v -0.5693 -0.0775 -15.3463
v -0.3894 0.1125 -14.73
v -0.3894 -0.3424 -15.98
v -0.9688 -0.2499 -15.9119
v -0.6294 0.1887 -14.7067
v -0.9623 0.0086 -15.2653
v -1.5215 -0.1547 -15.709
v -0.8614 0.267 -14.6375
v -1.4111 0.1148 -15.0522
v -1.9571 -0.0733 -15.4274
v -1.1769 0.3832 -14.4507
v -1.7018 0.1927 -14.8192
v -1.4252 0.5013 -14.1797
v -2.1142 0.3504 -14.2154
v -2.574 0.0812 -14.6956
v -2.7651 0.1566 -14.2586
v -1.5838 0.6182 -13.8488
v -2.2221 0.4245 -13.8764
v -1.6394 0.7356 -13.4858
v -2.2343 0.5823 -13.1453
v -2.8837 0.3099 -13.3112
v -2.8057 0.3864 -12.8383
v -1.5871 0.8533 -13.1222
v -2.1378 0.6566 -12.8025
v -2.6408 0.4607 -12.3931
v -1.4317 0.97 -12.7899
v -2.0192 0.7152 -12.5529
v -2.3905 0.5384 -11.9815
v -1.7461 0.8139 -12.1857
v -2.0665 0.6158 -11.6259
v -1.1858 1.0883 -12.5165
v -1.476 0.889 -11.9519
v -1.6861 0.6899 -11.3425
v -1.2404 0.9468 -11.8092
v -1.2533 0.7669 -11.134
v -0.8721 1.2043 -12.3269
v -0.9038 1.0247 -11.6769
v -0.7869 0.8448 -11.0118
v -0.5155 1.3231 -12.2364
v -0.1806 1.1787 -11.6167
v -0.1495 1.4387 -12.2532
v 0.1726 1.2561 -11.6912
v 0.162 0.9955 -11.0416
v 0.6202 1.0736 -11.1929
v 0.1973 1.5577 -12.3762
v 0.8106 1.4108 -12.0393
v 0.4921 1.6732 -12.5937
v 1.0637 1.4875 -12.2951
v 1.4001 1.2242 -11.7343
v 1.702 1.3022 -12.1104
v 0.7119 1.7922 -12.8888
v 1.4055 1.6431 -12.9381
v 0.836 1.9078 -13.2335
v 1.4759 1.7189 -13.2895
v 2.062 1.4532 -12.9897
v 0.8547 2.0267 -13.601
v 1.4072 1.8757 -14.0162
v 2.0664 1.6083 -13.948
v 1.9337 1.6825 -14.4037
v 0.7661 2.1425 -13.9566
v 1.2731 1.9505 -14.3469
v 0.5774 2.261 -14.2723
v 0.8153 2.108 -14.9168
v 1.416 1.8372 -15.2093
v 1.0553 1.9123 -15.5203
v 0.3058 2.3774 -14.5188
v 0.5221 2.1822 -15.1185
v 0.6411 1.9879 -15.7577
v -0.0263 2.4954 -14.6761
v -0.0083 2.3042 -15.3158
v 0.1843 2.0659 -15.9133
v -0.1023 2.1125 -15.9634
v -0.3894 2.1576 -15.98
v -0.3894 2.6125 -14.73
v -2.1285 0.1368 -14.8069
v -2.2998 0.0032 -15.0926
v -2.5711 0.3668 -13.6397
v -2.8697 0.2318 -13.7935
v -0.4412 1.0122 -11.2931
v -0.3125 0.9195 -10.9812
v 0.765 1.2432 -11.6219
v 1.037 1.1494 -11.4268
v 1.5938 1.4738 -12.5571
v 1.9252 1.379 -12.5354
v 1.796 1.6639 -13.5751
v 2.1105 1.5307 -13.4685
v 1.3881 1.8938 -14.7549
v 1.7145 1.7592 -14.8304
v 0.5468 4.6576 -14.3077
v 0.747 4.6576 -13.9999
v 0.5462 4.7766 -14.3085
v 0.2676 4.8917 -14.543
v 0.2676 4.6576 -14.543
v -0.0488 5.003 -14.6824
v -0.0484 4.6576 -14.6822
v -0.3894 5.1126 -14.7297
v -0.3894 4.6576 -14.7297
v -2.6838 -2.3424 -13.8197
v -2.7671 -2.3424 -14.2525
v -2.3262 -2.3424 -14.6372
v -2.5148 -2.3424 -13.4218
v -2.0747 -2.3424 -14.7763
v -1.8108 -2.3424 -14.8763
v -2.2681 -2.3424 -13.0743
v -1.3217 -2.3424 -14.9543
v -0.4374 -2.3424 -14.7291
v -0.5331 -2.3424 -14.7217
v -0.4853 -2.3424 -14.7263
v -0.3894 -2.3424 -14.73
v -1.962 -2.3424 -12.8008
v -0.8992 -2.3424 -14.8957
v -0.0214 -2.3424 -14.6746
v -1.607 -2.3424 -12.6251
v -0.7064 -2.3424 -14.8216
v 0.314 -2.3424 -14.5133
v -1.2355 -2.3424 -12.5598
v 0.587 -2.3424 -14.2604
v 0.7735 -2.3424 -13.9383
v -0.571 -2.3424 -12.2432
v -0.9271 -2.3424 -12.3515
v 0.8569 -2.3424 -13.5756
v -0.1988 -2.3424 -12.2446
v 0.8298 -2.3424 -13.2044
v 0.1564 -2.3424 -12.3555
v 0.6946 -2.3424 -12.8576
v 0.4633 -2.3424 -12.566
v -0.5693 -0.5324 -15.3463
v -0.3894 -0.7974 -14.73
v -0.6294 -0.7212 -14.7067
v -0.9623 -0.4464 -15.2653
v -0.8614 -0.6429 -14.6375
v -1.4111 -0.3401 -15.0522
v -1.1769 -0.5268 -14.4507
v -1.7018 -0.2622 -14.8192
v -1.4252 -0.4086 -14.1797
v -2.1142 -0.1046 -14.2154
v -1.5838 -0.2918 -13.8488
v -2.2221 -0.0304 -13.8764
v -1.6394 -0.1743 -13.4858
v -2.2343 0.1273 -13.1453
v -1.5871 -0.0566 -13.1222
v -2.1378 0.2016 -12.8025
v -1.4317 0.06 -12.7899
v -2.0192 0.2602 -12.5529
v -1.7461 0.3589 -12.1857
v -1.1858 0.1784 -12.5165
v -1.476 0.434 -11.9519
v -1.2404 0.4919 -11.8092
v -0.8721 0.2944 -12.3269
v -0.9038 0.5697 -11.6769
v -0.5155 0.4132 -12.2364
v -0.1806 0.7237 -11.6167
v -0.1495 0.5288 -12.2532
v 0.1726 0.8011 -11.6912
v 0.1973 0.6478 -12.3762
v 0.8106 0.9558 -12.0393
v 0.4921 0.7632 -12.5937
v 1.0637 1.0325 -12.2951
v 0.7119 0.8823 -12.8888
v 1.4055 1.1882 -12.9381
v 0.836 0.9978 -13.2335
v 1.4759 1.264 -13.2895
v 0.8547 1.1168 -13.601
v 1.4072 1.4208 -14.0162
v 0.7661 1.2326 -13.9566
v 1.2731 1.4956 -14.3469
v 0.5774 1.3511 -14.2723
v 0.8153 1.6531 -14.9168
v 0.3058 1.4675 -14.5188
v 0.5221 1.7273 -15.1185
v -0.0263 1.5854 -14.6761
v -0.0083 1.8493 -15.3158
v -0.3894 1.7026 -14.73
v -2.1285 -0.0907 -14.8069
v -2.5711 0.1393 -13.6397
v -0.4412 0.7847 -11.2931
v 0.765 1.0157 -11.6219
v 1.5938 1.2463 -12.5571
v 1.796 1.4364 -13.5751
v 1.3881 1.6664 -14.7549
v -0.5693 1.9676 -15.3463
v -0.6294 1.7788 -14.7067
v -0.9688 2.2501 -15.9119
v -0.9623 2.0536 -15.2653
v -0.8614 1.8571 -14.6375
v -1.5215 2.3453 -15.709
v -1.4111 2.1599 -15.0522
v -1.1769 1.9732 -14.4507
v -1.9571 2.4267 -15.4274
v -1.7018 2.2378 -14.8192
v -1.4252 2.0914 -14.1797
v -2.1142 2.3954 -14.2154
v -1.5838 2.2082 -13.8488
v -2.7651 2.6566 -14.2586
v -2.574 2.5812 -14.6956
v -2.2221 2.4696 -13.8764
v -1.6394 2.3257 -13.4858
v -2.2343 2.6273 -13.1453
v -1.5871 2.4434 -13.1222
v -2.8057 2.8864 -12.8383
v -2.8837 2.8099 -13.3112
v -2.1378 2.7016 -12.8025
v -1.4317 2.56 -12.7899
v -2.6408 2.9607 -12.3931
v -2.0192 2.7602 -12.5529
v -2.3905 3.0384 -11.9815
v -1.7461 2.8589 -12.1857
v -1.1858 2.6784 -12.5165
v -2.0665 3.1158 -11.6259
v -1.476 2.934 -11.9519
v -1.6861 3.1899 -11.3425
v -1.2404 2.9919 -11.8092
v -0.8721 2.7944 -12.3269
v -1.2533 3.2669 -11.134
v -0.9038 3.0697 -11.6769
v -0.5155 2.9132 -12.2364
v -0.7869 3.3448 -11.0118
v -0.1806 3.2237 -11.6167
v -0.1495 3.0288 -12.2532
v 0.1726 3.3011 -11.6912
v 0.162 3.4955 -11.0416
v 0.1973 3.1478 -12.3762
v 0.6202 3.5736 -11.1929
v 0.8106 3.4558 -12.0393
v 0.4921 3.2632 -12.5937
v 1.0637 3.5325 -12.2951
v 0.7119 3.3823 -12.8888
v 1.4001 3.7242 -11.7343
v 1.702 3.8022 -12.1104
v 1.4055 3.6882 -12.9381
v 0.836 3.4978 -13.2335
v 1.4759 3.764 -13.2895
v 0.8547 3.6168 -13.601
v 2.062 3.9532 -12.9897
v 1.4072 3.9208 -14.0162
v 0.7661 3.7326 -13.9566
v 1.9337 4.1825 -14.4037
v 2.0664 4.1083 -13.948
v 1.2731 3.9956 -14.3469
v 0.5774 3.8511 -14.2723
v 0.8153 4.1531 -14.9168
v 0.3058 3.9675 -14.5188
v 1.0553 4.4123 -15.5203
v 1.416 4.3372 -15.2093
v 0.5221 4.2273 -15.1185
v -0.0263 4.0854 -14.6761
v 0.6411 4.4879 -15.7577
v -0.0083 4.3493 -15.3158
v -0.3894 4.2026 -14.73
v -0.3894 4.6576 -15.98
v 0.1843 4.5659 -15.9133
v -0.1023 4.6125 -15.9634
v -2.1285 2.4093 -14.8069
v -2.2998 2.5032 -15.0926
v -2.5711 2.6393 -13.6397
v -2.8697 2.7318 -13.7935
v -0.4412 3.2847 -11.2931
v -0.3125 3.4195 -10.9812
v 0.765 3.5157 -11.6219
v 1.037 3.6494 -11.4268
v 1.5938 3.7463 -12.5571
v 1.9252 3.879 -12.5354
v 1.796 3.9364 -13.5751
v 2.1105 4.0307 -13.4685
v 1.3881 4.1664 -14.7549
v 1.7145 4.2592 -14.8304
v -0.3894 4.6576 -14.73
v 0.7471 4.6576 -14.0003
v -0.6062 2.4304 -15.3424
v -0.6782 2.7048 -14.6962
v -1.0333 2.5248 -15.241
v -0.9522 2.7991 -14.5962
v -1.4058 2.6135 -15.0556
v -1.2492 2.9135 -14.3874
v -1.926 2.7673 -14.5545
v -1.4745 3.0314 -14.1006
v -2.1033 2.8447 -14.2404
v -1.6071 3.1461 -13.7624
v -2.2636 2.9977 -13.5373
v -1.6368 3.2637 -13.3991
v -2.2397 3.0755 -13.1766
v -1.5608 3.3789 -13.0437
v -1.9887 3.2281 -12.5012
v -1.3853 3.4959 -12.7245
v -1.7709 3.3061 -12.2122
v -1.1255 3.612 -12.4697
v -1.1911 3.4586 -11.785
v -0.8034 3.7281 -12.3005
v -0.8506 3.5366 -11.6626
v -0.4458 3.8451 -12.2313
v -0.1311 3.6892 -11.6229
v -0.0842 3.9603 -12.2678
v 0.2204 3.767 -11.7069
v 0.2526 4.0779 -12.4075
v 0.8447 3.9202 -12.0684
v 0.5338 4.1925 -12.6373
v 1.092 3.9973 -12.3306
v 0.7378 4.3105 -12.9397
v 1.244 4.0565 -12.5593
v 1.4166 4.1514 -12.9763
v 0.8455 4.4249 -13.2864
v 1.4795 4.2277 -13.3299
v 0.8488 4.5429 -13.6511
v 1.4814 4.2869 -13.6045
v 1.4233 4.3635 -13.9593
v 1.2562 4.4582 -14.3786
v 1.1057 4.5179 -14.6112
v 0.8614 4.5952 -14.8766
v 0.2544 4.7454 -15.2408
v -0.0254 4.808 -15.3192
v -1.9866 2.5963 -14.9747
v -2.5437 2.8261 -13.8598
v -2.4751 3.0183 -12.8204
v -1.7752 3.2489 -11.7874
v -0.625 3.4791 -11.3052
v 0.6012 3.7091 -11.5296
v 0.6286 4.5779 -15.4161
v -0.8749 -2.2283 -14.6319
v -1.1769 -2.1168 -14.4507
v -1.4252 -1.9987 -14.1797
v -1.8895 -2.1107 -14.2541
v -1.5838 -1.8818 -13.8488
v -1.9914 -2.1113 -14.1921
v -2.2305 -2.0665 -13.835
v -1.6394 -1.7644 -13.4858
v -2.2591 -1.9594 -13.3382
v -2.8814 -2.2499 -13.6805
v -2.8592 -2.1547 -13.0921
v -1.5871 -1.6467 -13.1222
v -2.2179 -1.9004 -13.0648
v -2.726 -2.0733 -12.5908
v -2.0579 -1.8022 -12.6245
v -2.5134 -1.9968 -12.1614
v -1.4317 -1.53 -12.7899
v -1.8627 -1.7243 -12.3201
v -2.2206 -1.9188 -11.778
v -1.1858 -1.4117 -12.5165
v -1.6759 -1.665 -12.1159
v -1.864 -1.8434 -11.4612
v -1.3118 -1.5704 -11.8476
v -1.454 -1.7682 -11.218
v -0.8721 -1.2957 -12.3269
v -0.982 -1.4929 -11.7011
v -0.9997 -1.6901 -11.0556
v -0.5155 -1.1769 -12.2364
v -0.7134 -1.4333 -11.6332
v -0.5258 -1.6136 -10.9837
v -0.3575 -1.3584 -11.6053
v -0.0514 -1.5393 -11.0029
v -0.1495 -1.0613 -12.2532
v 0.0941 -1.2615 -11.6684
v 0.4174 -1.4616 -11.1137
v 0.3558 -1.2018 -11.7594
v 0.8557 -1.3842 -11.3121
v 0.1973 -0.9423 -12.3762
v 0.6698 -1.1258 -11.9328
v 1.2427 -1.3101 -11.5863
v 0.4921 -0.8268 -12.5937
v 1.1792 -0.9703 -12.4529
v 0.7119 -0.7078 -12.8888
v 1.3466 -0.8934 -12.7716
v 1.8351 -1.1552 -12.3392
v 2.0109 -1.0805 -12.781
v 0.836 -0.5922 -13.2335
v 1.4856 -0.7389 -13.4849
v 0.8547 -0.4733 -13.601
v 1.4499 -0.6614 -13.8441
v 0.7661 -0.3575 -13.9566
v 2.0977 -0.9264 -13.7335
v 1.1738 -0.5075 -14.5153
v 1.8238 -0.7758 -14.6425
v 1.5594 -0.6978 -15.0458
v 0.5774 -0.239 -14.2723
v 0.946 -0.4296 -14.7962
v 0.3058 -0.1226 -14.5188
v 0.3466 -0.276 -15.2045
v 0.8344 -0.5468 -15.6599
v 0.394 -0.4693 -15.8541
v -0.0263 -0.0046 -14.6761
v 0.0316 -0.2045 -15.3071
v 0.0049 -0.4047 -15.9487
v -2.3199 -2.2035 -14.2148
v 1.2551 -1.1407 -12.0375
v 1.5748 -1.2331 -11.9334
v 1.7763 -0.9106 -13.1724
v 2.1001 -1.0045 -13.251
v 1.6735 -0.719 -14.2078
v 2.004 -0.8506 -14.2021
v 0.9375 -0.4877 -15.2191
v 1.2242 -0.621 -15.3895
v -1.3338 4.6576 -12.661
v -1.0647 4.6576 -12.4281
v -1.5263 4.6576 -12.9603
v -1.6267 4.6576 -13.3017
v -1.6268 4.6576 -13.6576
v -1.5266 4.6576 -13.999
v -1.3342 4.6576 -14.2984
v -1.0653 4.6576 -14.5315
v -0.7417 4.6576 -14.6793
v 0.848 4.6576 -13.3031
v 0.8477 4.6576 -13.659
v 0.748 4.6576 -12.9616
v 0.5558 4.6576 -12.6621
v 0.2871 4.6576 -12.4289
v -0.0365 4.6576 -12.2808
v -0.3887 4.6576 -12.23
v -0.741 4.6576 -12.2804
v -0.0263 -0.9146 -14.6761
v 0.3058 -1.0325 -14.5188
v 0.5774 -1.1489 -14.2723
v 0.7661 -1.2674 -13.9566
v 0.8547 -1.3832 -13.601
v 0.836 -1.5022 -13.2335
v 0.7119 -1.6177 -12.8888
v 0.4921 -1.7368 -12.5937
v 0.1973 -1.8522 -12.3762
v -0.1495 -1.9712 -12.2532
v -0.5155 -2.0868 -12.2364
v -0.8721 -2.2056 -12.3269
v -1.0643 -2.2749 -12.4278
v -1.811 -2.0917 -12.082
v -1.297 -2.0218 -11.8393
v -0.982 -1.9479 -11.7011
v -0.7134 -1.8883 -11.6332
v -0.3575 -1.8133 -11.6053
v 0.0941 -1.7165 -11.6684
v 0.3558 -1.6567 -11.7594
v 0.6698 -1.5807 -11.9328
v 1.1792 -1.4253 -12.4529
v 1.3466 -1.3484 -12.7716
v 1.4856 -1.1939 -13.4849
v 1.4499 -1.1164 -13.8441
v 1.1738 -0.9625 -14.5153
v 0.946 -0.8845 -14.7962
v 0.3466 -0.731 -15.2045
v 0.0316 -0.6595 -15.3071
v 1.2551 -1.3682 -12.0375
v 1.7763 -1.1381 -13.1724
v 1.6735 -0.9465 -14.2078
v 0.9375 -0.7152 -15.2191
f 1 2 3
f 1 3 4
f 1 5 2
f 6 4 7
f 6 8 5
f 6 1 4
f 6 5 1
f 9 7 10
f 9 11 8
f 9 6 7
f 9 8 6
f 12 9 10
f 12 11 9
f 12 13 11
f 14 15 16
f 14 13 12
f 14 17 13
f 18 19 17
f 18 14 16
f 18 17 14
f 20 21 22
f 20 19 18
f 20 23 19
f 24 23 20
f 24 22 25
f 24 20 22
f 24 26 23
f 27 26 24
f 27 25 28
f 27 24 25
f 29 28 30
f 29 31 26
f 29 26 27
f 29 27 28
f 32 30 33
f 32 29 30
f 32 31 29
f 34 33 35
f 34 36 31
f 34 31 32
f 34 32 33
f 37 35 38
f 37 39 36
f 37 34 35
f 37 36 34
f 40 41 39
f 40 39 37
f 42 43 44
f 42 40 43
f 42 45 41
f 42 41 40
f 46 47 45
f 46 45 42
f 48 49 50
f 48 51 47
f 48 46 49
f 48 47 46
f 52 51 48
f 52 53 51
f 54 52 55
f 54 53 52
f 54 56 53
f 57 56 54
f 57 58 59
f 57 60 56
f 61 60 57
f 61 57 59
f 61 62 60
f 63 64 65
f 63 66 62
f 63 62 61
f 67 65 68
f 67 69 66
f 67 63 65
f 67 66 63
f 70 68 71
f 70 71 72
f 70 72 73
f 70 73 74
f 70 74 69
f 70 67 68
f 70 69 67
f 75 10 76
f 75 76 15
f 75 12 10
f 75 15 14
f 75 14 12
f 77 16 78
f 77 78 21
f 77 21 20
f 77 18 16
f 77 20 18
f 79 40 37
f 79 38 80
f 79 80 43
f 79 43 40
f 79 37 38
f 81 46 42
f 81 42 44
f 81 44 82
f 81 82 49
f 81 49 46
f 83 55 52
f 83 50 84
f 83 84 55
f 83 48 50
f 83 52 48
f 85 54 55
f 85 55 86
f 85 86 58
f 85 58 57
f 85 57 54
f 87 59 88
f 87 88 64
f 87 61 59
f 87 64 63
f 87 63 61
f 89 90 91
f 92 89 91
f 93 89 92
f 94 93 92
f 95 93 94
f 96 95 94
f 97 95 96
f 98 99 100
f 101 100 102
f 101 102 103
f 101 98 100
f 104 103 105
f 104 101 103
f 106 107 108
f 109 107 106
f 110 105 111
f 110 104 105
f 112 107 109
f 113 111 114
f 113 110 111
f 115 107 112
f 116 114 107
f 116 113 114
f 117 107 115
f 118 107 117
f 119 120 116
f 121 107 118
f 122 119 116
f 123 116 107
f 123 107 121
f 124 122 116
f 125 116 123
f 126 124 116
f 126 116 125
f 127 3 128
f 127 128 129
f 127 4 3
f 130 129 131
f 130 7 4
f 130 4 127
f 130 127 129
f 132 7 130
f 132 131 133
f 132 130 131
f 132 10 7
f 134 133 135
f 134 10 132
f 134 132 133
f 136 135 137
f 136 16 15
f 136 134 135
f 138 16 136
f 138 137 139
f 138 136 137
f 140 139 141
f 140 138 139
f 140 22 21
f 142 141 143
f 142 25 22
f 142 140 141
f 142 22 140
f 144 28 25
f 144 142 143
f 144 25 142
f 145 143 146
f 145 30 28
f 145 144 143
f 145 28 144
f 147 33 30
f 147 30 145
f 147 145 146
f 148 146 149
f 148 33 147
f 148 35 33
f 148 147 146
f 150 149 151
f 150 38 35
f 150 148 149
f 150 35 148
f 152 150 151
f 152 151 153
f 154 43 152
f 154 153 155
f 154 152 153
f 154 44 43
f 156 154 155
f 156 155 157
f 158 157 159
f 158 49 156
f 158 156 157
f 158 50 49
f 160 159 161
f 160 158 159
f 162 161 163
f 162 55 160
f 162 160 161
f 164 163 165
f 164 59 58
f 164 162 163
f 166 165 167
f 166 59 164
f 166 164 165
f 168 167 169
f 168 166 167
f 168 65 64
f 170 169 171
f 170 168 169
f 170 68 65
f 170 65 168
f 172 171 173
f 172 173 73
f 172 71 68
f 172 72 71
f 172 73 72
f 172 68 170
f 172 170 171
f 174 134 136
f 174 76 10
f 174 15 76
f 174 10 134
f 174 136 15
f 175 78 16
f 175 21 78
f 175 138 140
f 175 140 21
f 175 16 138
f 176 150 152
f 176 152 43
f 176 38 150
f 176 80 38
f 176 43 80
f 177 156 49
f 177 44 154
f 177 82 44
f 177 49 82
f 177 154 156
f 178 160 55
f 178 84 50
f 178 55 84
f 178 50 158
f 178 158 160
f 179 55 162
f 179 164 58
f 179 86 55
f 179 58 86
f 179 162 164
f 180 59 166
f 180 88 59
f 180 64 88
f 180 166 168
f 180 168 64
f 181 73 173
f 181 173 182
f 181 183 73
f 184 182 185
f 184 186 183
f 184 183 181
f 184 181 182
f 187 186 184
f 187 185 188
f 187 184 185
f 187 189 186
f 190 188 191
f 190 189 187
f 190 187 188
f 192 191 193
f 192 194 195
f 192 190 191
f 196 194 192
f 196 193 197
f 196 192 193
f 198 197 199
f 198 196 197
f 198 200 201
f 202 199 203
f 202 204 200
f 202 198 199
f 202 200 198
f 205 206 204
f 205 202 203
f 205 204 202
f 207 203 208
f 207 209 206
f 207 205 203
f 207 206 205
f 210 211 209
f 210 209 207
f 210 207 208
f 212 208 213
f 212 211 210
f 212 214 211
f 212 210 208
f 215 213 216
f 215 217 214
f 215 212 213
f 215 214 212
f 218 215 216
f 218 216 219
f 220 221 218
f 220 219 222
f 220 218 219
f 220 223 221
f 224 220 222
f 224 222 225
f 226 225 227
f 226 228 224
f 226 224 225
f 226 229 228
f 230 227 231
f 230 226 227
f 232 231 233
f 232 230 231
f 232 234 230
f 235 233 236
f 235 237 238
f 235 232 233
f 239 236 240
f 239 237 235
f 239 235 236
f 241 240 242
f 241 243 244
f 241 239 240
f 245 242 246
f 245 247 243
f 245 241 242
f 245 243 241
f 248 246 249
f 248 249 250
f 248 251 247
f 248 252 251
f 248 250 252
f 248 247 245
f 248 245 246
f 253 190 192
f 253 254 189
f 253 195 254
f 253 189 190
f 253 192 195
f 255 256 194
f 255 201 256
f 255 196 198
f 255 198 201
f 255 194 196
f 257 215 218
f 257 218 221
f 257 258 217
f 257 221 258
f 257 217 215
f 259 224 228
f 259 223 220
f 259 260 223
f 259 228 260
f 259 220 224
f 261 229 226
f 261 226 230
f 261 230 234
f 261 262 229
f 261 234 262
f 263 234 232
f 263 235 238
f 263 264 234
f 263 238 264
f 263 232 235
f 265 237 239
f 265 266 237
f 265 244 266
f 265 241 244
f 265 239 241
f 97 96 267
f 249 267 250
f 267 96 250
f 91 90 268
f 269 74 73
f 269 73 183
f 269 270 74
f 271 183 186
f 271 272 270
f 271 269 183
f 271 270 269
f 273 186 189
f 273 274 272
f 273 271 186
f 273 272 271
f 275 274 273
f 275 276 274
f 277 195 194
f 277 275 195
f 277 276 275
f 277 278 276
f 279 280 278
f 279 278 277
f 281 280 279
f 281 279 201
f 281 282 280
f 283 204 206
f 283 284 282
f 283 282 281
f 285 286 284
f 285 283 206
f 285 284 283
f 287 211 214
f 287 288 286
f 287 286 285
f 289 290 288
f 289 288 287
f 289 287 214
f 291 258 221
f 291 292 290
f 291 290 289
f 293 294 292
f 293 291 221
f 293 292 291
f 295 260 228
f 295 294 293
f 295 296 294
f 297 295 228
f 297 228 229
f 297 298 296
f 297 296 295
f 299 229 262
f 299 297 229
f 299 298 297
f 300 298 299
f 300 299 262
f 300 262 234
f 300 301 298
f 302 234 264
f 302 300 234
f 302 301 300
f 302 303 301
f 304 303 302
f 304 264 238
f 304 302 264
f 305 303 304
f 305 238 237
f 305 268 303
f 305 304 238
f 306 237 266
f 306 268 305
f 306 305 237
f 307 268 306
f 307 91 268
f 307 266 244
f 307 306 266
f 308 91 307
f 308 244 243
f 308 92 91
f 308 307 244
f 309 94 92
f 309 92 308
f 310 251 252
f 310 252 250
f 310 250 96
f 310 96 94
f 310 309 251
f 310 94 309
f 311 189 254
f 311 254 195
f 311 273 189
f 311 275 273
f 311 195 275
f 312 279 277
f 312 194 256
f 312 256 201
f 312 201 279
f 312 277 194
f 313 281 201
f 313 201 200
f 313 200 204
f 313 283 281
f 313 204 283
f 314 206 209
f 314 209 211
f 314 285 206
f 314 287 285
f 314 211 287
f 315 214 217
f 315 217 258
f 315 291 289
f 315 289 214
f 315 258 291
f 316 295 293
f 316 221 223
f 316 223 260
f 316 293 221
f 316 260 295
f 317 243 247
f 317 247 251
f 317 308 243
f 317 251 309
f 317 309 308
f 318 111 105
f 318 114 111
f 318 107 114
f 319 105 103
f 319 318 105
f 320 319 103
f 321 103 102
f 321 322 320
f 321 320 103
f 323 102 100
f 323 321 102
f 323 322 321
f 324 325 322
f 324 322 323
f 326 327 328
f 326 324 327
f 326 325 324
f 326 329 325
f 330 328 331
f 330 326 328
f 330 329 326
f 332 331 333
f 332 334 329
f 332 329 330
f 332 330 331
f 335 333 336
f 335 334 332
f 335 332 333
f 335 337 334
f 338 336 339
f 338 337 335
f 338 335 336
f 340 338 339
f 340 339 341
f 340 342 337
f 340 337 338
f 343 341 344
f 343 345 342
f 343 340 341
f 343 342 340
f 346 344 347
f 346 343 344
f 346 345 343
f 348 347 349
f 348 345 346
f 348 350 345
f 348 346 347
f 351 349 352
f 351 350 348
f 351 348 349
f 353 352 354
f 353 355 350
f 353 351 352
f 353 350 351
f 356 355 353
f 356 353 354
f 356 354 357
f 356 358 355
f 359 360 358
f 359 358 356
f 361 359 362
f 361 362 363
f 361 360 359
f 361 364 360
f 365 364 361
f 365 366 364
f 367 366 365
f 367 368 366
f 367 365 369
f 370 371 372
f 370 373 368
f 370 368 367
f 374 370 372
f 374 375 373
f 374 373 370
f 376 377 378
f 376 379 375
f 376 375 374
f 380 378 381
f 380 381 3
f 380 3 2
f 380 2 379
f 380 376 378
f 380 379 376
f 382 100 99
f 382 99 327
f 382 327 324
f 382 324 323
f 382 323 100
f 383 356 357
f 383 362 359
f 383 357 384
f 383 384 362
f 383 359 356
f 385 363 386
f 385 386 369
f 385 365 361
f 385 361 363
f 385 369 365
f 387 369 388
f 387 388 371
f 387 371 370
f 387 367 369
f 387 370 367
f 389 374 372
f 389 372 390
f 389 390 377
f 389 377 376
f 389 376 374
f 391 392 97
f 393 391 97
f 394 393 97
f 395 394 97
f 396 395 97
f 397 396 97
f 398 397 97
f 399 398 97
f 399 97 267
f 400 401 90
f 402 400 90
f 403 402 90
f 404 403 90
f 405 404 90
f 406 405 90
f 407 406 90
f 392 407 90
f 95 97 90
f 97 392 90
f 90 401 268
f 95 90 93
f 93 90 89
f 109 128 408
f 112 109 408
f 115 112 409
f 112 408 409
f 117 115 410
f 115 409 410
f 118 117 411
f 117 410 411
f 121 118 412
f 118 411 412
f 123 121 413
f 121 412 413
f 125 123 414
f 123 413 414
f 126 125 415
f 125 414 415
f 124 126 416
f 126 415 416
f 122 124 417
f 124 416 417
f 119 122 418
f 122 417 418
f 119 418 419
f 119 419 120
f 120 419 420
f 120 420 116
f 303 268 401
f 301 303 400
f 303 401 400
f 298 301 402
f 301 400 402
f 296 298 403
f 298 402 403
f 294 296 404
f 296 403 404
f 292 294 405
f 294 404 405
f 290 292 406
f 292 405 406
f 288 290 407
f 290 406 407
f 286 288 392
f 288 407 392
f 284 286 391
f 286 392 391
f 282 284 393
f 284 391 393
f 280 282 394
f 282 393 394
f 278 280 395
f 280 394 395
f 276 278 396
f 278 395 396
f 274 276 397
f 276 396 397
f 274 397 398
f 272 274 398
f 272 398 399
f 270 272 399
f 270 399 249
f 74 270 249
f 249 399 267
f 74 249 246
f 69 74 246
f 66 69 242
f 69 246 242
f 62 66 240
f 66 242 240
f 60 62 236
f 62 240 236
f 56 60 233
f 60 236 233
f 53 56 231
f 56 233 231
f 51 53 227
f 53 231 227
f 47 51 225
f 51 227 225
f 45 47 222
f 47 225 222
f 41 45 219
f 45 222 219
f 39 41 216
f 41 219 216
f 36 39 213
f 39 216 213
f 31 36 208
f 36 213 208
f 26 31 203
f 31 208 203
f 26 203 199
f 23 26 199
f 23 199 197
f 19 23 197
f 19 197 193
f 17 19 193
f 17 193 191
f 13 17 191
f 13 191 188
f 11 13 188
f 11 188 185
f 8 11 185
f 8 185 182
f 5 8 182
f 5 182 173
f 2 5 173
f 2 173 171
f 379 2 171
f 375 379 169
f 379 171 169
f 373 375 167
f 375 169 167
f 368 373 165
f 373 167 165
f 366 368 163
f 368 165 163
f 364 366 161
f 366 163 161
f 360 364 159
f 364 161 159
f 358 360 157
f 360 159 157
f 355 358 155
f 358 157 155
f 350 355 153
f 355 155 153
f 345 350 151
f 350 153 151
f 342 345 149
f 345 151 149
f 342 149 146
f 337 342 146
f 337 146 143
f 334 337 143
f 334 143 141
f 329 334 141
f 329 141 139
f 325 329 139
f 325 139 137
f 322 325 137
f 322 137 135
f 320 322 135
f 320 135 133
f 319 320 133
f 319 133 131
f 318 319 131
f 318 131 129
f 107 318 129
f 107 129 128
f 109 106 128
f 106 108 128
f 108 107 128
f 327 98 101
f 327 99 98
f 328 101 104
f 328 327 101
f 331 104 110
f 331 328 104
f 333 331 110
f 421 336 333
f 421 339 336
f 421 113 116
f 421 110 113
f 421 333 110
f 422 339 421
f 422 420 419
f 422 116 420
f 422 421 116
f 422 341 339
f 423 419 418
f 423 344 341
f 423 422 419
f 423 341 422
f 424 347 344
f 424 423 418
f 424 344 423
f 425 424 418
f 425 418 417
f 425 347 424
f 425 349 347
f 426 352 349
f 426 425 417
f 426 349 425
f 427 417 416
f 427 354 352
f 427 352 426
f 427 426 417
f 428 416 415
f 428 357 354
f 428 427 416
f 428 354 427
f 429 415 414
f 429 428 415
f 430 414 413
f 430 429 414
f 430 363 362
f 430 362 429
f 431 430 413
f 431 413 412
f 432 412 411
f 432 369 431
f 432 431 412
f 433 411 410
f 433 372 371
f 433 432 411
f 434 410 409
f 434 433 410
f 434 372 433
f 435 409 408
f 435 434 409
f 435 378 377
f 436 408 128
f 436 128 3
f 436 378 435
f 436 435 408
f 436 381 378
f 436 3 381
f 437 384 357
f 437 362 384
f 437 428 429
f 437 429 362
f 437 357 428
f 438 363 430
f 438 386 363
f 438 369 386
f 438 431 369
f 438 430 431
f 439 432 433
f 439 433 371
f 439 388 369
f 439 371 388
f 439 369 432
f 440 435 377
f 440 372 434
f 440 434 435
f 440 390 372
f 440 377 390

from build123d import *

# Parameters (mm, degrees)
ESQUISSE2_R           = 1.25
EXTRUSION1_DEPTH      = 10
BALAYAGE1_PITCH       = 2.5
EXTRUSION2_DEPTH      = 20.313652943
EXTRUSION2_DEPTH_BACK = 3
ESQUISSE5_R           = 3.615449726


with BuildPart() as part:
    # Esquisse2 → Extrusion1 (new body)
    with BuildSketch(Plane.XZ.offset(-4.657558322)):
        with Locations(Location((-0.389434894, -13.47998185, 0), (0, 0, 270))):
            Circle(ESQUISSE2_R)
    extrude(amount=EXTRUSION1_DEPTH)

    # Balayage1: the profile of Esquisse4 profile screwed along a right-hand helix of 4 turns, 10 arcs to a turn; built about Z, then put on its axis
    balayage1_z = Axis((0, 0, 0), (0, 0, 1))
    balayage1_corners = [(2.5, 0, 0), (1.2497, 0, 0.455071984), (1.2497, 0, -0.455071984)]
    with BuildLine(mode=Mode.PRIVATE) as balayage1_profile:
        Line(balayage1_corners[0], balayage1_corners[1])
        Line(balayage1_corners[1], balayage1_corners[2])
        Line(balayage1_corners[2], balayage1_corners[0])
    balayage1_cap = Face(balayage1_profile.wire())
    balayage1_turn_angles = [0, 18, 36, 54, 72, 90, 108, 126, 144, 162, 180, 198, 216, 234, 252, 270, 288, 306, 324, 342, 360]
    balayage1_turn_weights = [1, 0.9510565162951535, 1, 0.9510565162951535, 1, 0.9510565162951535, 1, 0.9510565162951535, 1, 0.9510565162951535, 1, 0.9510565162951535, 1, 0.9510565162951535, 1, 0.9510565162951535, 1, 0.9510565162951535, 1, 0.9510565162951535, 1]
    balayage1_turn_rails = [Edge.make_bspline([Vector(p[0], p[1], 0).rotate(balayage1_z, balayage1_turn_angles[k]) / balayage1_turn_weights[k] + Vector(0, 0, p[2] + BALAYAGE1_PITCH * balayage1_turn_angles[k] / 360) for k in range(21)], [0, 0, 0, 1, 1, 2, 2, 3, 3, 4, 4, 5, 5, 6, 6, 7, 7, 8, 8, 9, 9, 10, 10, 10], 2, balayage1_turn_weights) for p in balayage1_corners]
    balayage1_turn_sides = [Face.make_surface_from_curves(balayage1_turn_rails[p[0]], balayage1_turn_rails[p[1]]) for p in [(0, 1), (1, 2), (2, 0)]]
    balayage1 = Plane(origin=(-0.389434894, -5.342441678, -13.47998185), x_dir=(0, 0, -1), z_dir=(0, 1, 0)) * Solid(Shell([*[p.moved(Location((0, 0, BALAYAGE1_PITCH * i))) for i in range(4) for p in balayage1_turn_sides], balayage1_cap, balayage1_cap.rotate(balayage1_z, 1440).moved(Location((0, 0, BALAYAGE1_PITCH * 1440 / 360)))]))
    add(balayage1)

    # Esquisse5 → Extrusion2 (cut, two sides: drawn at the far end of the back side and taken through both)
    with BuildSketch(Plane.XZ.offset(5.342441678).offset(-EXTRUSION2_DEPTH_BACK)):
        with Locations((-0.389434894, -13.47998185)):
            Circle(ESQUISSE5_R)
    extrude(amount=EXTRUSION2_DEPTH + EXTRUSION2_DEPTH_BACK, mode=Mode.SUBTRACT)


solid = part.part
